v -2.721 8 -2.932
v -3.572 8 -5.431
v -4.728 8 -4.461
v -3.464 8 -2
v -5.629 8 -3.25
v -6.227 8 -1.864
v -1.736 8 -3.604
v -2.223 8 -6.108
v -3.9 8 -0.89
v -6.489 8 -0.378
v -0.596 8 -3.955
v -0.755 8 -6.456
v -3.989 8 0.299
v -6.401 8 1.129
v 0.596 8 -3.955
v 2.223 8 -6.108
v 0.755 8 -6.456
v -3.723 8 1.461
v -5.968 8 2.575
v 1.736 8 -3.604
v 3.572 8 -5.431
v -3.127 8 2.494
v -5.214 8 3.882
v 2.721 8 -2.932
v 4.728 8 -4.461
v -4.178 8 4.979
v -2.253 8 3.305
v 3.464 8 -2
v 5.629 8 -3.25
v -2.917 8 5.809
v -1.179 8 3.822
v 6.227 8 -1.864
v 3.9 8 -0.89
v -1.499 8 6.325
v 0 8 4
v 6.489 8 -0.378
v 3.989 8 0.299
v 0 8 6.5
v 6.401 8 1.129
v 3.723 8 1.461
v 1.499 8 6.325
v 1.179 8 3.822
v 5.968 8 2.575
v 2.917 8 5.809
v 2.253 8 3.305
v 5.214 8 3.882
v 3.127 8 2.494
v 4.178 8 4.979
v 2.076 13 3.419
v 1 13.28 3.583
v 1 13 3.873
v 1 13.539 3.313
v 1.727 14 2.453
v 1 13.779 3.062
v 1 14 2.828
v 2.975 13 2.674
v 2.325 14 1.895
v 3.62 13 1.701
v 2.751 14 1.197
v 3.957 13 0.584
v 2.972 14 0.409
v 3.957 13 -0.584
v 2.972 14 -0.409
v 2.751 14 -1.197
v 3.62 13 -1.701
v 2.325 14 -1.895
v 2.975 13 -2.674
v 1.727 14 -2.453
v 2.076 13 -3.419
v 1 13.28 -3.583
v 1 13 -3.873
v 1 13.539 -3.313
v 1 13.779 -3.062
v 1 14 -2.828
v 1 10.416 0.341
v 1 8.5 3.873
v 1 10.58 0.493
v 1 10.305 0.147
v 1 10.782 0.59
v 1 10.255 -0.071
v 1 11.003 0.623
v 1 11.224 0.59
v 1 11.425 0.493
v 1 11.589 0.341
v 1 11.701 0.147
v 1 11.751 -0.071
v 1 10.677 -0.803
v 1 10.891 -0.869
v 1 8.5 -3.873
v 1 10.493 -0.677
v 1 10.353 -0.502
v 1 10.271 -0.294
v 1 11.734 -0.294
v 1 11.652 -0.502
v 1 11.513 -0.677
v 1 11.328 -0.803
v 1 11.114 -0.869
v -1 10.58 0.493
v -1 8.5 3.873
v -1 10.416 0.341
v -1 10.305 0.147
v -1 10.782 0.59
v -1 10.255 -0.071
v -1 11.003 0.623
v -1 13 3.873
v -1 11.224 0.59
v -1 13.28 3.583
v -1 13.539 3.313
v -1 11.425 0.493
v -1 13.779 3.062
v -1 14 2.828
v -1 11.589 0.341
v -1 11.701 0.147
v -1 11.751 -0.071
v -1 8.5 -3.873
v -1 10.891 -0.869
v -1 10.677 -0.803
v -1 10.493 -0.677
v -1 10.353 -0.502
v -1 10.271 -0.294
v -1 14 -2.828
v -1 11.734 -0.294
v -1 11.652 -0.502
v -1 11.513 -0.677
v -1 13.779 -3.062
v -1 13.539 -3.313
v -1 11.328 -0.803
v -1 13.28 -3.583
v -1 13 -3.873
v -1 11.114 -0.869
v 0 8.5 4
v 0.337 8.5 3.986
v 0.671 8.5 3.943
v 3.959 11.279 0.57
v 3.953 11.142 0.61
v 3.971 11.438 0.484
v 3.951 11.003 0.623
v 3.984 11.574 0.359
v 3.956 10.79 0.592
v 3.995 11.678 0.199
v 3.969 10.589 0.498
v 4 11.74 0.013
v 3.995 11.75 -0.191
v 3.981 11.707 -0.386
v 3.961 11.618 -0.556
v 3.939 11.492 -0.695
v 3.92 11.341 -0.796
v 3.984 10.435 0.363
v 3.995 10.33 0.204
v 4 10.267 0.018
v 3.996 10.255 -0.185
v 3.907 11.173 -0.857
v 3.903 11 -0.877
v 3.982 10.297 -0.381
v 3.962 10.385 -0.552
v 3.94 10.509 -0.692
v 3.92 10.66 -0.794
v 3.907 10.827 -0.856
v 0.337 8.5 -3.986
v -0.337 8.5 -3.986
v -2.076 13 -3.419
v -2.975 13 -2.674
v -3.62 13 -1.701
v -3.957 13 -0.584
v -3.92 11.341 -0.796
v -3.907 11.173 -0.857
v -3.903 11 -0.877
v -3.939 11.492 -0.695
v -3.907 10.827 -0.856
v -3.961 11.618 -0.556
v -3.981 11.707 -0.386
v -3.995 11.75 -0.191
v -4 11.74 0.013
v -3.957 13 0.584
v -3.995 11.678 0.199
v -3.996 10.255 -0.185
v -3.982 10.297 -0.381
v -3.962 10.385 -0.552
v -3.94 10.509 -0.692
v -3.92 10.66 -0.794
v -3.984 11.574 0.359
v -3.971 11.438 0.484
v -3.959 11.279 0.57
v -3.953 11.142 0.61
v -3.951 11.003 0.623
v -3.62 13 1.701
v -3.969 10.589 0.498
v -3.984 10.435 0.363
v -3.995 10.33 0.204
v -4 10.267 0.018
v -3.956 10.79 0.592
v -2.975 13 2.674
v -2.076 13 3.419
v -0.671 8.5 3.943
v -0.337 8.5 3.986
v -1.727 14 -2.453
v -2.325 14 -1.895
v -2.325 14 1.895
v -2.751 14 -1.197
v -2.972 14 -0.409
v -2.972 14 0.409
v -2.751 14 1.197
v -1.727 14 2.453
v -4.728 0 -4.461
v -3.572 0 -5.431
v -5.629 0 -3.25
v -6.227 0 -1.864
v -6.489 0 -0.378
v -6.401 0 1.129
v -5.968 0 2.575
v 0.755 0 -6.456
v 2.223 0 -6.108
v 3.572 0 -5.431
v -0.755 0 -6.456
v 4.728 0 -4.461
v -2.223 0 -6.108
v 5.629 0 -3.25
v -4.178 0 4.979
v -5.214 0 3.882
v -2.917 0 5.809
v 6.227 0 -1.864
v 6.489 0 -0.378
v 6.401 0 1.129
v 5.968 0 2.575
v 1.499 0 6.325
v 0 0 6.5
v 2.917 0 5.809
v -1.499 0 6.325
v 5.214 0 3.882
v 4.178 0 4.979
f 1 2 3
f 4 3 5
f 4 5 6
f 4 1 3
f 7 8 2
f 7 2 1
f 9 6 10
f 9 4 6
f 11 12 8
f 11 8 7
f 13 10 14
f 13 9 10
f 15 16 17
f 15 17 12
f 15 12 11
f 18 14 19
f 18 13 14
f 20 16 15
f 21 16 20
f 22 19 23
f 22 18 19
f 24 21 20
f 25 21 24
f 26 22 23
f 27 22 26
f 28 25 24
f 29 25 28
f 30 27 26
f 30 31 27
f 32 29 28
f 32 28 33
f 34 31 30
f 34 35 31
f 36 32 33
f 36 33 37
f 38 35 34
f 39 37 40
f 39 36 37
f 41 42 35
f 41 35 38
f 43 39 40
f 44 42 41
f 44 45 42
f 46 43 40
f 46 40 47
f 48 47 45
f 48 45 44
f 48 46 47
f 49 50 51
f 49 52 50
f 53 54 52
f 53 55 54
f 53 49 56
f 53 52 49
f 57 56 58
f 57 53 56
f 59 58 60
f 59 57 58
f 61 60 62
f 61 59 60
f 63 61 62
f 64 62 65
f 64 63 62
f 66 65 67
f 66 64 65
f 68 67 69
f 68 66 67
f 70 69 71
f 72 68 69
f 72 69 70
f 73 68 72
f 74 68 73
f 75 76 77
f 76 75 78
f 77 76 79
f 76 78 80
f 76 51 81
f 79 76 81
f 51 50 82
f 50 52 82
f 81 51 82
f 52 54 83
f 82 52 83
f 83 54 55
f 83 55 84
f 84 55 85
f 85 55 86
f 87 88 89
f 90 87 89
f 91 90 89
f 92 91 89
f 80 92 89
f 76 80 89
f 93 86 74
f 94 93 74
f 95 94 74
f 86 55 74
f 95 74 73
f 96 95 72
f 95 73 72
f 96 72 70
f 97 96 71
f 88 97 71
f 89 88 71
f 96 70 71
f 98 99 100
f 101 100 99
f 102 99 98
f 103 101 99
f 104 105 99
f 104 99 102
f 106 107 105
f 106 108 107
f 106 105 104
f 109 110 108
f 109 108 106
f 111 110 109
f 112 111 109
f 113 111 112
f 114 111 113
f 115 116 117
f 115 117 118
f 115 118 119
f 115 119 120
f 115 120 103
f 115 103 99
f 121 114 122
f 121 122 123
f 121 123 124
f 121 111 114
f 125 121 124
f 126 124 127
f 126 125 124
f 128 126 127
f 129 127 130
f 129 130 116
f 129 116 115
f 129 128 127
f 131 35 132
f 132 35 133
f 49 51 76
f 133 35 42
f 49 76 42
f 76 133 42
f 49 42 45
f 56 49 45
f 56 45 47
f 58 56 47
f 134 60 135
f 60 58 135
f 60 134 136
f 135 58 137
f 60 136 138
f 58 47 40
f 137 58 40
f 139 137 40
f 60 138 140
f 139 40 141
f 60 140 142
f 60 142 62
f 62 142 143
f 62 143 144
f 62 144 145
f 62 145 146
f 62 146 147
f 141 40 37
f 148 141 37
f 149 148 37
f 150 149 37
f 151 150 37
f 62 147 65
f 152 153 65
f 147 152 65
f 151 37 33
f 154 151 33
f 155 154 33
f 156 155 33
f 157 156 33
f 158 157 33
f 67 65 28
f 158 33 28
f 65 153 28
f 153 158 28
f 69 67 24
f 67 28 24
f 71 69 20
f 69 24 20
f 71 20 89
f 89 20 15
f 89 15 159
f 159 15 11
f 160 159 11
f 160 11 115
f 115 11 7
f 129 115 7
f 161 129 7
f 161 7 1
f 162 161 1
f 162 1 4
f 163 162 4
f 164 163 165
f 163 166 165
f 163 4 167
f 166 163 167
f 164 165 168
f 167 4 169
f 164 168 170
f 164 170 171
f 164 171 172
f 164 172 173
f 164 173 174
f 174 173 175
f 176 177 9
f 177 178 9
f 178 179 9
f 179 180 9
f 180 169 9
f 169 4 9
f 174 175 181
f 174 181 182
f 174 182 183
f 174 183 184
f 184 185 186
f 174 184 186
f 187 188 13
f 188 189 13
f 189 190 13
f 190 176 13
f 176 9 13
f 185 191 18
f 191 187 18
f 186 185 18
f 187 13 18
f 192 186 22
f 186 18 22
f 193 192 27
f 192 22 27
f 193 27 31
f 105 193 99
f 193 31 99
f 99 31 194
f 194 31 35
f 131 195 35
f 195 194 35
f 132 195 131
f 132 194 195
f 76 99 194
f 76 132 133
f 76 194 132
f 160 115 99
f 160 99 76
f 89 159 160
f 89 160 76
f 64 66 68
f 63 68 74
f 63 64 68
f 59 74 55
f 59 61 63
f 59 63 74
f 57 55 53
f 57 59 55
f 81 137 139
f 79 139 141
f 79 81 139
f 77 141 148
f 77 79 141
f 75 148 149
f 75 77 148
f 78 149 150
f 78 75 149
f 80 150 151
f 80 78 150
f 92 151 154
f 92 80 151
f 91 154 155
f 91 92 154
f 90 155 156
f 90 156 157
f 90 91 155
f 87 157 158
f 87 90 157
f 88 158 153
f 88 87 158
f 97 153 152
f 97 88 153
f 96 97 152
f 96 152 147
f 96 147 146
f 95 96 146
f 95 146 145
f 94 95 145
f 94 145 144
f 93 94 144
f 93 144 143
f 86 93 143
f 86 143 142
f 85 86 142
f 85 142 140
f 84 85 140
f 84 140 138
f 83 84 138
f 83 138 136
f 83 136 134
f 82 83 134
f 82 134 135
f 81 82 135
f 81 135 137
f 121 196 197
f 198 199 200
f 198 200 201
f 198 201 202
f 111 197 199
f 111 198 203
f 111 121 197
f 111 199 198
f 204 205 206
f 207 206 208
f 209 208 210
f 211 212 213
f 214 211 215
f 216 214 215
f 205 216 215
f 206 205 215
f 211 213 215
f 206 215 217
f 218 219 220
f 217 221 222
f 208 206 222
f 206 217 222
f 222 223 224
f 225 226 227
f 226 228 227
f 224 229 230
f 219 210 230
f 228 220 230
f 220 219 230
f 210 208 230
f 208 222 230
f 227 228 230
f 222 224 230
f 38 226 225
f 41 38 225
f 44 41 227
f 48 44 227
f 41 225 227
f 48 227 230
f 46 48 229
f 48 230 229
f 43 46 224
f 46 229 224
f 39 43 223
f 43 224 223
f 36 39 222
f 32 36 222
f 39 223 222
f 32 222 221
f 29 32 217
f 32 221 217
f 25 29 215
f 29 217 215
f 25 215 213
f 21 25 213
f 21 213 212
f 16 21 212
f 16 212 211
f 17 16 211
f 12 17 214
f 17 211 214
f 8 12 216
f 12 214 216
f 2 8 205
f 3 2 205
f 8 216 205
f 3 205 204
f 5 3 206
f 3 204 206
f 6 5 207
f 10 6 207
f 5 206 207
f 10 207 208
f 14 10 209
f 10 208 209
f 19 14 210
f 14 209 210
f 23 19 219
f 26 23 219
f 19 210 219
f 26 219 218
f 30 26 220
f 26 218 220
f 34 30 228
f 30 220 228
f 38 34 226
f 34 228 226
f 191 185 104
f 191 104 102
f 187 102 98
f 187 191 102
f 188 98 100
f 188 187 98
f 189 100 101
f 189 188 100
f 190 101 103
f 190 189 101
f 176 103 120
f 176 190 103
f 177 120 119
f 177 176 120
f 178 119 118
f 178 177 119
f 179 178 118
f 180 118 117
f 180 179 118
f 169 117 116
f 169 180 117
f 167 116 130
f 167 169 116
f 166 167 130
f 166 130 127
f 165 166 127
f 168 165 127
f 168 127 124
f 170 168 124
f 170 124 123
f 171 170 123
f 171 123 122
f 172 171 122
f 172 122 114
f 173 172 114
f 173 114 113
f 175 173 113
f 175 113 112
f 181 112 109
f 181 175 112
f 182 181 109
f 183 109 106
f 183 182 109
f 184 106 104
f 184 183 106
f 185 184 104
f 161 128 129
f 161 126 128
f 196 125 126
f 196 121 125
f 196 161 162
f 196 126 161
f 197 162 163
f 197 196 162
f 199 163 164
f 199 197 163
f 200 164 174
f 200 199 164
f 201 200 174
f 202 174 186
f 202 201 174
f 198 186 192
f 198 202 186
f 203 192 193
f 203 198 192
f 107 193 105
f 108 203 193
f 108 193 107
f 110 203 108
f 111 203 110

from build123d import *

# Parameters (mm, degrees)
SKETCH1_R               = 6.5
BOSS_EXTRUDE1_DEPTH     = 8
SKETCH2_R               = 4
BOSS_EXTRUDE2_DEPTH     = 6
SKETCH3_W               = 2
SKETCH3_H               = 9
CUT_EXTRUDE1_DEPTH      = 5.5
CHAMFER1_SIZE           = 1
CHAMFER2_SIZE           = 1
CUT_EXTRUDE3_DEPTH      = 5.5
CUT_EXTRUDE3_DEPTH_BACK = 5.5
SKETCH5_R               = 0.75


with BuildPart() as part:
    # Sketch1 → Boss-Extrude1 (new body)
    with BuildSketch(Plane(origin=(0, 0, 0), x_dir=(1, 0, 0), z_dir=(0, 1, 0))):
        with Locations(Location((0, 0, 0), (0, 0, 270))):
            Circle(SKETCH1_R)
    extrude(amount=BOSS_EXTRUDE1_DEPTH)

    # Sketch2 → Boss-Extrude2 (add)
    with BuildSketch(Plane(origin=(0, 8, 0), x_dir=(1, 0, 0), z_dir=(0, 1, 0))):
        with Locations(Location((0, 0, 0), (0, 0, 270))):
            Circle(SKETCH2_R)
    extrude(amount=BOSS_EXTRUDE2_DEPTH)

    # Sketch3 → Cut-Extrude1 (cut)
    with BuildSketch(Plane(origin=(0, 14, 0), x_dir=(1, 0, 0), z_dir=(0, 1, 0))):
        Rectangle(SKETCH3_W, SKETCH3_H)
    extrude(amount=-CUT_EXTRUDE1_DEPTH, mode=Mode.SUBTRACT)

    # Chamfer1
    chamfer1_edges = [part.edges().sort_by_distance(p)[0] for p in [
        (4, 14, 0),
    ]]
    chamfer(chamfer1_edges, length=CHAMFER1_SIZE)

    # Chamfer2
    chamfer2_edges = [part.edges().sort_by_distance(p)[0] for p in [
        (-4, 14, 0),
    ]]
    chamfer(chamfer2_edges, length=CHAMFER2_SIZE)

    # Sketch5 → Cut-Extrude3 (cut, two sides: drawn at the far end of the back side and taken through both)
    with BuildSketch(Plane(origin=(0, 0, 0), x_dir=(0, 0, -1), z_dir=(1, 0, 0)).offset(-CUT_EXTRUDE3_DEPTH_BACK)):
        with Locations(Location((0.127016654, 11.002690078, 0), (0, 0, 180))):
            Circle(SKETCH5_R)
    extrude(amount=CUT_EXTRUDE3_DEPTH + CUT_EXTRUDE3_DEPTH_BACK, mode=Mode.SUBTRACT)


solid = part.part
